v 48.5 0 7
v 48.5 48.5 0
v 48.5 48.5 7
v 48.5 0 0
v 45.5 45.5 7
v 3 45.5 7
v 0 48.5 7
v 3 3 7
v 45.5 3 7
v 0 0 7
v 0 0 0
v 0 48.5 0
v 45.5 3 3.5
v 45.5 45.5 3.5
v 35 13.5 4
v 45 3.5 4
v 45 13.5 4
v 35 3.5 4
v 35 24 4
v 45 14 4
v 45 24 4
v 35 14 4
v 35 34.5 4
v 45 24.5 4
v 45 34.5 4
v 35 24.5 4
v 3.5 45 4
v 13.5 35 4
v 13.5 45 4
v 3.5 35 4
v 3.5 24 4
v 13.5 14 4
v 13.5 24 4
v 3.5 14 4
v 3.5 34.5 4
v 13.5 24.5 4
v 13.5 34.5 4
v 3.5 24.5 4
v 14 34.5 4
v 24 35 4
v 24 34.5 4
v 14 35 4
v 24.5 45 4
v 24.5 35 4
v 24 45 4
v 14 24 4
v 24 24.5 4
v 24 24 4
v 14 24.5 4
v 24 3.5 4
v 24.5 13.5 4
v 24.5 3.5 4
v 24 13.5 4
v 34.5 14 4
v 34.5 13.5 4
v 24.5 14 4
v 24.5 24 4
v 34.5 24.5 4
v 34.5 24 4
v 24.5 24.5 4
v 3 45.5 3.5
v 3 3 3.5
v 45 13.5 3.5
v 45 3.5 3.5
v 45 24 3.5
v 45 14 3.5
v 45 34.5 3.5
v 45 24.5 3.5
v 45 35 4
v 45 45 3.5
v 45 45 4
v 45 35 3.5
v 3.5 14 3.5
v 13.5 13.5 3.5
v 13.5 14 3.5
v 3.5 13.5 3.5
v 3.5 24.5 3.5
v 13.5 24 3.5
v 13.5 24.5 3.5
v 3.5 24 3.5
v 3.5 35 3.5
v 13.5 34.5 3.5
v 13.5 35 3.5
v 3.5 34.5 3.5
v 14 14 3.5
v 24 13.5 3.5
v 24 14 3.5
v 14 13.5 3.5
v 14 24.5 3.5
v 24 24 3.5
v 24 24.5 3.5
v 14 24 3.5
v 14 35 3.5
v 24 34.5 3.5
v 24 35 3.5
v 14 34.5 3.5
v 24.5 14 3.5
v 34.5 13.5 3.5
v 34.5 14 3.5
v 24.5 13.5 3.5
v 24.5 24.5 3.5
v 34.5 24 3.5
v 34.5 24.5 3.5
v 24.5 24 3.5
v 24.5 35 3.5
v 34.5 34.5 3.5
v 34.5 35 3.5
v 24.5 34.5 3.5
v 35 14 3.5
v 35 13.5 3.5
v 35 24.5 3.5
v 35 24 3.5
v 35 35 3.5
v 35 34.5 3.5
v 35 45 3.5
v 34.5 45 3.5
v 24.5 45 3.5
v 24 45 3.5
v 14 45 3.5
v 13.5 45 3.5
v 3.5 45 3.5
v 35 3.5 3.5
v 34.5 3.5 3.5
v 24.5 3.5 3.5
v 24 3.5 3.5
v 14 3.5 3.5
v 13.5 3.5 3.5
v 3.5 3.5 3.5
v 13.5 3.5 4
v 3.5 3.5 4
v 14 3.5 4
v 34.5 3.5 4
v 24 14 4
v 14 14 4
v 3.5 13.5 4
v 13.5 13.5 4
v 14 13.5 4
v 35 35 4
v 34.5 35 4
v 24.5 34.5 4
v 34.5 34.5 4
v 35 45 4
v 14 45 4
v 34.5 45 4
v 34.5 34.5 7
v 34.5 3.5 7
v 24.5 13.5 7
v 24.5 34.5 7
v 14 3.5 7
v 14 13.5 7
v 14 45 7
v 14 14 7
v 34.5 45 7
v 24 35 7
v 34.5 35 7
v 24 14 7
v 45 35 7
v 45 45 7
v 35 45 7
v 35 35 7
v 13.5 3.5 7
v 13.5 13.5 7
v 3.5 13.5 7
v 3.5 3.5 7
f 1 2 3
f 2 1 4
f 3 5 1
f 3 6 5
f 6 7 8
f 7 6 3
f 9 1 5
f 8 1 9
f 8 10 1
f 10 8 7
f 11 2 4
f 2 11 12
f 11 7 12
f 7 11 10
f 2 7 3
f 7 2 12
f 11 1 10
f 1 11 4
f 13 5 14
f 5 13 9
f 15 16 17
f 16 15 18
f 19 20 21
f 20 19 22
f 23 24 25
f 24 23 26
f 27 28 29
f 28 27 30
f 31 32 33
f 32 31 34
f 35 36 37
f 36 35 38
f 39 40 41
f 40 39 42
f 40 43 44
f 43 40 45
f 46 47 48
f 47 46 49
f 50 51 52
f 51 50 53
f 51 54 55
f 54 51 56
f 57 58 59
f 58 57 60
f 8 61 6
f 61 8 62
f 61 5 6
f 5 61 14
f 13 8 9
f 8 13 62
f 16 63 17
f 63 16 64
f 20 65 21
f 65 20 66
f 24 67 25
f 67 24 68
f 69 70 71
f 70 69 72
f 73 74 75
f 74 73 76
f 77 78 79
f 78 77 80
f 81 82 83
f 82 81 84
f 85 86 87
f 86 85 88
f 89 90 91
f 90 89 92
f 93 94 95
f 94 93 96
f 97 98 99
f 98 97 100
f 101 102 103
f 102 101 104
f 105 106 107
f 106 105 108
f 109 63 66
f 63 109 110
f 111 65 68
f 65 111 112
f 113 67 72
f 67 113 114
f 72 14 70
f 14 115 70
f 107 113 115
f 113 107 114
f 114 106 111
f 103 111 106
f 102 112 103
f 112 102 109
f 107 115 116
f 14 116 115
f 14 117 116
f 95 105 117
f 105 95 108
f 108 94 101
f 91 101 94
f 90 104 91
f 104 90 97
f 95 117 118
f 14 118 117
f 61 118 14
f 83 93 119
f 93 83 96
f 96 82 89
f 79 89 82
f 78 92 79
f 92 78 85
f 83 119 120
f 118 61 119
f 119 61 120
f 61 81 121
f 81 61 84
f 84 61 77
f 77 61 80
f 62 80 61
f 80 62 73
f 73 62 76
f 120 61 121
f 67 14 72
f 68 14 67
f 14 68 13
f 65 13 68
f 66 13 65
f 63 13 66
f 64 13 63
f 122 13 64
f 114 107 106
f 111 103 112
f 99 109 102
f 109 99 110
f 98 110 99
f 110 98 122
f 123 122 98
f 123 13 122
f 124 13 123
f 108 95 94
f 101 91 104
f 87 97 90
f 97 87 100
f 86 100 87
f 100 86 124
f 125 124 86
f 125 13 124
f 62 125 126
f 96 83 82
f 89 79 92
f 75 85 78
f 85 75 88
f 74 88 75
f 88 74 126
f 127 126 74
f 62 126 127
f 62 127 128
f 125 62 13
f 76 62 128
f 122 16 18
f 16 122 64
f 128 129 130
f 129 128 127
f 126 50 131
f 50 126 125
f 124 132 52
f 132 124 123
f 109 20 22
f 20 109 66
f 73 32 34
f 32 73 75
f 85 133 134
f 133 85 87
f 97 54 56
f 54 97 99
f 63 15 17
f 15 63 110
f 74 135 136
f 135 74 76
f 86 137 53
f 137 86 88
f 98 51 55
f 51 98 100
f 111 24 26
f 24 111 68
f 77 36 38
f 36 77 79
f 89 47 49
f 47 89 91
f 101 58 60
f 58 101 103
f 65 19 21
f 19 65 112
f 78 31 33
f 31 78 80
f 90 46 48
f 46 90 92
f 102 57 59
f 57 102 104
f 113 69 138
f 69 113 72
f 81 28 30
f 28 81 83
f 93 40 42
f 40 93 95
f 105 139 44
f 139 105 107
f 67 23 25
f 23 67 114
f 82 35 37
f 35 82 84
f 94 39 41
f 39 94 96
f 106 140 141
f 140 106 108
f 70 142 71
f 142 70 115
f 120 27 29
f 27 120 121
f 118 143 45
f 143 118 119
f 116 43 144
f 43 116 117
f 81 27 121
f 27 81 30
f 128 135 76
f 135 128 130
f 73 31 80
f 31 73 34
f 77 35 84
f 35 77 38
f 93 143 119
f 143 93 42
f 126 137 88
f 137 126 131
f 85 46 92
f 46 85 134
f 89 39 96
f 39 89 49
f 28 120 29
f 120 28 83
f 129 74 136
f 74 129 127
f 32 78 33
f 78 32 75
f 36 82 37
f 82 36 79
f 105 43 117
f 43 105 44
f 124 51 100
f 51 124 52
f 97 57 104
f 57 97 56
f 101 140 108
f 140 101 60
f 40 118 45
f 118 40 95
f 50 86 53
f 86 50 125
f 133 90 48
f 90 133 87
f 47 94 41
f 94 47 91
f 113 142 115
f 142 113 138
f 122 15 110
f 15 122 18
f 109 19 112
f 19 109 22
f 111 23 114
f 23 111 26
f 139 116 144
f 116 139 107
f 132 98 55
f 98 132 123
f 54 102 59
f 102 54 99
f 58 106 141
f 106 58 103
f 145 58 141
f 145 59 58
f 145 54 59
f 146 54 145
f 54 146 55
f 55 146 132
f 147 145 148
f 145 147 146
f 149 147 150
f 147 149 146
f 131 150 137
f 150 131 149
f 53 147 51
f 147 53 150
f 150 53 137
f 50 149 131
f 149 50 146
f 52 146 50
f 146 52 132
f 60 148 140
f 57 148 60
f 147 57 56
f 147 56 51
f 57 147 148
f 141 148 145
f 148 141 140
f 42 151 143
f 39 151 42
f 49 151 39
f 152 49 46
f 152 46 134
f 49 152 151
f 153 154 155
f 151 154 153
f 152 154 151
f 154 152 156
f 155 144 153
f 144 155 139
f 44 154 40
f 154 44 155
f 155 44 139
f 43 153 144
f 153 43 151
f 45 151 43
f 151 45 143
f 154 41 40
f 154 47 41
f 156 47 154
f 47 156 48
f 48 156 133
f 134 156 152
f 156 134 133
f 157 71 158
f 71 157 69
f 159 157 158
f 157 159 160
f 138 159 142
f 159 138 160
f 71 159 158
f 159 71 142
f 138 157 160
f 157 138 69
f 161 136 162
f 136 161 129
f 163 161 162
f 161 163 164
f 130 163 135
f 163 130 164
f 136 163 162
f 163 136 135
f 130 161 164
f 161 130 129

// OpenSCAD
einheit=10;

translate([0,0,0]) baseplate();
translate([14,3.5,4]) piece_l();
rotate([0,0,180]) translate([-34.5,-45,4]) piece_l();
translate([35,35,4]) piece_square();
translate([3.5,3.5,4]) piece_square();


module baseplate()
{
    difference()
    {
        translate([0,0,0]) 
            cube([4*einheit+8.5,4*einheit+8.5,7]);
        translate([3,3,4]) 
            cube([4*einheit+2.5,4*einheit+2.5,7]);
        // Trenner H
        translate([3,3,3.5]) 
            cube([4*einheit+2,0.5,7]);
        translate([3,13.5,3.5]) 
            cube([4*einheit+2,0.5,7]);
        translate([3,24,3.5]) 
            cube([4*einheit+2,0.5,7]);
        translate([3,34.5,3.5]) 
            cube([4*einheit+2,0.5,7]);
        translate([3,45,3.5]) 
            cube([4*einheit+2,0.5,7]);
        // Trenner V
        translate([3,3,3.5]) 
            cube([0.5,4*einheit+2,7]);
        translate([13.5,3,3.5]) 
            cube([0.5,4*einheit+2,7]);
        translate([24,3,3.5]) 
            cube([0.5,4*einheit+2,7]);
        translate([34.5,3,3.5]) 
            cube([0.5,4*einheit+2,7]);
        translate([45,3,3.5]) 
            cube([0.5,4*einheit+2.5,7]);
    }
}

module piece_l()
{
    translate([0,0,0]) 
        cube([2*einheit+0.5,einheit,3]);
    translate([einheit+0.5,0,0]) 
        cube([einheit,3*einheit+1,3]);
}

module piece_square()
{
  translate([0,0,0]) cube([einheit,einheit,3]);
}
